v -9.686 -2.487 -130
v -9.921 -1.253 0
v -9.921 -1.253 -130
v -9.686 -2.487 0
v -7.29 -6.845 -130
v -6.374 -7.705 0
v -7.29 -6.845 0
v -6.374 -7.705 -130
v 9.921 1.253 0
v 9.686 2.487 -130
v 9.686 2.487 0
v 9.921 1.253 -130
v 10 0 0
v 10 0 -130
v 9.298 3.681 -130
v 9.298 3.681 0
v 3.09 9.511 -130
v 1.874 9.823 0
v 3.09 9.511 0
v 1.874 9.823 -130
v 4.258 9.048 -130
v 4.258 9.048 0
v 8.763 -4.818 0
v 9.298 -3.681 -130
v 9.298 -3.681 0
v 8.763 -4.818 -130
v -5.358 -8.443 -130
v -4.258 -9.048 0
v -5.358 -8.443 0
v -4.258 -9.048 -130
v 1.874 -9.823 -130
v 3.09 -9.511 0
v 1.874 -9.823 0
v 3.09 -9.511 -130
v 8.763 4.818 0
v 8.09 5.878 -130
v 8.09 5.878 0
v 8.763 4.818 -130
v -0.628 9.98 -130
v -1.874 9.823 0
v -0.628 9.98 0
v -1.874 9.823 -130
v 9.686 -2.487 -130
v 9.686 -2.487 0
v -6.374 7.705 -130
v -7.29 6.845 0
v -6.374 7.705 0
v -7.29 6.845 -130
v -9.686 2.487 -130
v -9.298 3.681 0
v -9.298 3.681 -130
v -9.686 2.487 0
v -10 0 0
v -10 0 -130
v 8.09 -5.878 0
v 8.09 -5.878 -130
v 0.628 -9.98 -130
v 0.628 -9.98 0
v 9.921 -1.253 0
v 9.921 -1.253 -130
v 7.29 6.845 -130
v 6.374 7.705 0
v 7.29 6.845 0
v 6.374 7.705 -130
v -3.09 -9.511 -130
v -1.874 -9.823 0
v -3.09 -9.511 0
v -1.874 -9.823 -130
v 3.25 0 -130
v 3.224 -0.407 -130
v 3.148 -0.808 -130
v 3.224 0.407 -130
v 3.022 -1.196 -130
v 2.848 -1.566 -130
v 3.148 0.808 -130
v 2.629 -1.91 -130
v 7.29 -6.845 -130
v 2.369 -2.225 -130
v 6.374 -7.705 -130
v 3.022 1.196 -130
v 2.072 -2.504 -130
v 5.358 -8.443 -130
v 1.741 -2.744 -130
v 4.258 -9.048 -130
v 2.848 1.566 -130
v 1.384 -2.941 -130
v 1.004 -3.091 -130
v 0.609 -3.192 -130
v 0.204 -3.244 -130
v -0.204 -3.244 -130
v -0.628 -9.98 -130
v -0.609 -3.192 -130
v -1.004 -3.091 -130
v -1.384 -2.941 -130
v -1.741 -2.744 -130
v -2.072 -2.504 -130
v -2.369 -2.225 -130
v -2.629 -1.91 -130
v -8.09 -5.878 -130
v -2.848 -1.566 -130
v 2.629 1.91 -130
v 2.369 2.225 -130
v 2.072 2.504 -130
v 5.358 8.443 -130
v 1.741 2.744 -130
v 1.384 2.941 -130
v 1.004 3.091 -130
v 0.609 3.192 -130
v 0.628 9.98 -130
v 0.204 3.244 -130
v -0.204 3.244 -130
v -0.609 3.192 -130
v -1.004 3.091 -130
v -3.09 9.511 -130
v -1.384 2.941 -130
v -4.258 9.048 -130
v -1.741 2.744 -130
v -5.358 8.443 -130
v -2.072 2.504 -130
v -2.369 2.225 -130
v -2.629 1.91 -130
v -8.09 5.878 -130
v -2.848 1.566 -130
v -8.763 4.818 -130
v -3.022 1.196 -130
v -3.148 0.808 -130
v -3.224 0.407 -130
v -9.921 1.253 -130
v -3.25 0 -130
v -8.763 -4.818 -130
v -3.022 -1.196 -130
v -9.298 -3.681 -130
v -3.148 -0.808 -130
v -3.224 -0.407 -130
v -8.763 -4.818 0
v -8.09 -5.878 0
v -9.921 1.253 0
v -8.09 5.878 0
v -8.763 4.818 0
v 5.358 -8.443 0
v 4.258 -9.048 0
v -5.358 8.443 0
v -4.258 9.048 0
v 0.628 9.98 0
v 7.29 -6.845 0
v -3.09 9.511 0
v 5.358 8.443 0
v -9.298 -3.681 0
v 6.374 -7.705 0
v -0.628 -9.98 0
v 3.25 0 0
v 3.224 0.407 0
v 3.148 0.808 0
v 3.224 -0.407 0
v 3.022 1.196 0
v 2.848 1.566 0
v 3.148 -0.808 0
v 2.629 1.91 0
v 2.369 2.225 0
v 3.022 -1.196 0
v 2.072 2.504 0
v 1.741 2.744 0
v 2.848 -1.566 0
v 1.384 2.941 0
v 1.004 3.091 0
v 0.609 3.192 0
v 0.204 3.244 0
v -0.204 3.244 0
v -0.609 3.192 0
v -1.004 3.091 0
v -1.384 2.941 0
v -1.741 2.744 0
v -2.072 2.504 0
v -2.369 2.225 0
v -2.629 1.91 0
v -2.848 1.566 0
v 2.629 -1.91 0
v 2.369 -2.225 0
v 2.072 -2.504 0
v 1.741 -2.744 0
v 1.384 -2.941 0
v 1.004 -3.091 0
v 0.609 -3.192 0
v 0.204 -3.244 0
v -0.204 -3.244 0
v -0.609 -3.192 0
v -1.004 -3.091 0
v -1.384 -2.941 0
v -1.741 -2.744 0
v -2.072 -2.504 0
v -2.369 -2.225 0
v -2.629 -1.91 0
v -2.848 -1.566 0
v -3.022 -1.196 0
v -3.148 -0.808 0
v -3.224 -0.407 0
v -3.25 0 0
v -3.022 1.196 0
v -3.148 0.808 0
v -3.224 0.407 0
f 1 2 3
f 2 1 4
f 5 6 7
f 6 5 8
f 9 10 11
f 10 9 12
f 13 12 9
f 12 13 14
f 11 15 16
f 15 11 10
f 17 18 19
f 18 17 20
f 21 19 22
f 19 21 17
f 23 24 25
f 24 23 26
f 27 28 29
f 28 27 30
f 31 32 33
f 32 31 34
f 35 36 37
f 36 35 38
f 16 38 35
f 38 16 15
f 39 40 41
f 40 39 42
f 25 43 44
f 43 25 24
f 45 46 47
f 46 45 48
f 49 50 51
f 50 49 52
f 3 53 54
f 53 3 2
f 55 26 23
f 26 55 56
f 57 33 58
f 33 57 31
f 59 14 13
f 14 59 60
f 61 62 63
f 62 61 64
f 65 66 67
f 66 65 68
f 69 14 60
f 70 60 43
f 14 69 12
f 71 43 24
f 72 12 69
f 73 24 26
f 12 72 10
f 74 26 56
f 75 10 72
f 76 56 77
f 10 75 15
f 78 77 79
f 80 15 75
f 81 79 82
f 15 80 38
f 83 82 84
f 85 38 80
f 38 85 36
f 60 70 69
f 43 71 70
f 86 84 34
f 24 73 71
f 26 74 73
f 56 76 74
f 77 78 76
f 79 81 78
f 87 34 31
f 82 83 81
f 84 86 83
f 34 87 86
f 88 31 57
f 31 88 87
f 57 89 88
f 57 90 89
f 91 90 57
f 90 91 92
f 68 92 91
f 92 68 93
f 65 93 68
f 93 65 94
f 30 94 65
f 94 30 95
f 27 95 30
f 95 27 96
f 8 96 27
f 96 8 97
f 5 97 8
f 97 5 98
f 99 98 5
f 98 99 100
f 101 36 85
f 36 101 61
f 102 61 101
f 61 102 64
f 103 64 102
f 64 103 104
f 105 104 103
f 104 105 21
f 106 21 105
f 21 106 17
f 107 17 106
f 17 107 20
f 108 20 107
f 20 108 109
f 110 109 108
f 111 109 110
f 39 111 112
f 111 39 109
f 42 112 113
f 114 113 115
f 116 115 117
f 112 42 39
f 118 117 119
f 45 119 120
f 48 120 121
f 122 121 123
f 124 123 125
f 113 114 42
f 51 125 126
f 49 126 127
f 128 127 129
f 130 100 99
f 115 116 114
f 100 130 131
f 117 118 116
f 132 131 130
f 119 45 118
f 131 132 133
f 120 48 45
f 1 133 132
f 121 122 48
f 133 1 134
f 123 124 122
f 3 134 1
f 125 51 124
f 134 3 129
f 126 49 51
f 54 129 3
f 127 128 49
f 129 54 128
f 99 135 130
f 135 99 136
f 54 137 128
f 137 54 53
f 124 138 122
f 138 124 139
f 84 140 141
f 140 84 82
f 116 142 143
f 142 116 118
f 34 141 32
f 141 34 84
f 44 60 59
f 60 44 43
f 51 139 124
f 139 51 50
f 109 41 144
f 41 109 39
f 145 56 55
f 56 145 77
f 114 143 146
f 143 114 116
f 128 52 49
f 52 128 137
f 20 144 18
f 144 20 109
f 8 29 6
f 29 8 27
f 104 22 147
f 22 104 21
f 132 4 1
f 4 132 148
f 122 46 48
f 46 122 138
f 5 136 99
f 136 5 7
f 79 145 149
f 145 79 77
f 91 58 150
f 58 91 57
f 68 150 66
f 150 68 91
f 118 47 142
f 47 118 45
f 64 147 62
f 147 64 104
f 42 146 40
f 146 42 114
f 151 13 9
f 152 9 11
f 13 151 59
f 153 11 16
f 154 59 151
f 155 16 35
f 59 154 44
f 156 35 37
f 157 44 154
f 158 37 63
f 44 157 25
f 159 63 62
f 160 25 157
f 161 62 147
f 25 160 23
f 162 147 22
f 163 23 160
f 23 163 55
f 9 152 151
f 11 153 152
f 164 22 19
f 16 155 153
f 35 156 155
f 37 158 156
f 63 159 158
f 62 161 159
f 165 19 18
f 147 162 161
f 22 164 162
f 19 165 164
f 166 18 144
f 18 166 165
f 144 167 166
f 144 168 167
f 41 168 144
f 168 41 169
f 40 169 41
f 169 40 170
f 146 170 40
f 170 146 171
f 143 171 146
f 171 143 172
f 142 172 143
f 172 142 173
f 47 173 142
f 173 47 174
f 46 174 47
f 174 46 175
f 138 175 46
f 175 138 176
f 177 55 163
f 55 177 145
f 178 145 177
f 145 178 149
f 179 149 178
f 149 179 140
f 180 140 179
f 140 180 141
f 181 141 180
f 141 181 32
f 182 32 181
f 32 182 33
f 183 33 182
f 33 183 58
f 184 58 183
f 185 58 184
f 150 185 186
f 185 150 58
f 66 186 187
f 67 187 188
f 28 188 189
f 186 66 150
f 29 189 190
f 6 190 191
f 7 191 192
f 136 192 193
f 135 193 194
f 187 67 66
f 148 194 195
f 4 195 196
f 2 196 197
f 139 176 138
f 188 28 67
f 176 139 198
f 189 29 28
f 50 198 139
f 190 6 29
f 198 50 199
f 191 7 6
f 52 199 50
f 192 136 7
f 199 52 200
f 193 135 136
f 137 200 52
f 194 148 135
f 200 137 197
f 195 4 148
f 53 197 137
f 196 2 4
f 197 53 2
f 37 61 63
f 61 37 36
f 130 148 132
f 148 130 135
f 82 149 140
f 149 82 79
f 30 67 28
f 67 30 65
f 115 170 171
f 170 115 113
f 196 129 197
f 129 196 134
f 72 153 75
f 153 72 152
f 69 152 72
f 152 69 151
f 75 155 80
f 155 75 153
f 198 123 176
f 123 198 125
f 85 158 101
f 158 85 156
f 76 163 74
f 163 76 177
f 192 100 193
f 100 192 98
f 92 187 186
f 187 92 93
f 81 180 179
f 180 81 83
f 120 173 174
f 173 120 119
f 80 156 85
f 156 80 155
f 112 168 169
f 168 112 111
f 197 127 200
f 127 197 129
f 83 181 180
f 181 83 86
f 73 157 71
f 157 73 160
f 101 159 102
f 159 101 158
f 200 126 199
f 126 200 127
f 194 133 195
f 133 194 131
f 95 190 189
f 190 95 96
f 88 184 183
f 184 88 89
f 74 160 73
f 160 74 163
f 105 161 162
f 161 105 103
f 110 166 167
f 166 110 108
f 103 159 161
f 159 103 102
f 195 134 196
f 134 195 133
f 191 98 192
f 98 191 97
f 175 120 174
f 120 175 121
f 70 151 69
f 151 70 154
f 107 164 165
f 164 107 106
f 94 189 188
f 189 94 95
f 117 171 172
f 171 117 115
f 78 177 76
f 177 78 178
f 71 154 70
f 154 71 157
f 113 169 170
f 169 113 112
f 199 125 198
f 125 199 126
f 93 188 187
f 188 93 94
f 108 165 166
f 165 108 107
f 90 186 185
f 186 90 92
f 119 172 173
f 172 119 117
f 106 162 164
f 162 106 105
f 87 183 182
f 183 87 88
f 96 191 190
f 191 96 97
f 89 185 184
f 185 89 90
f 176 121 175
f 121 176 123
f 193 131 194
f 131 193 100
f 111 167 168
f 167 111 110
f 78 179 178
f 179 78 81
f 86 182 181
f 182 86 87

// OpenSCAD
$fn = 50;


difference() {
	union() {
		translate(v = [0, 0, -130.0000000000]) {
			cylinder(h = 130, r = 10.0000000000);
		}
	}
	union() {
		#translate(v = [0, 0, -130]) {
			cylinder(h = 130, r = 3.2500000000);
		}
	}
}
